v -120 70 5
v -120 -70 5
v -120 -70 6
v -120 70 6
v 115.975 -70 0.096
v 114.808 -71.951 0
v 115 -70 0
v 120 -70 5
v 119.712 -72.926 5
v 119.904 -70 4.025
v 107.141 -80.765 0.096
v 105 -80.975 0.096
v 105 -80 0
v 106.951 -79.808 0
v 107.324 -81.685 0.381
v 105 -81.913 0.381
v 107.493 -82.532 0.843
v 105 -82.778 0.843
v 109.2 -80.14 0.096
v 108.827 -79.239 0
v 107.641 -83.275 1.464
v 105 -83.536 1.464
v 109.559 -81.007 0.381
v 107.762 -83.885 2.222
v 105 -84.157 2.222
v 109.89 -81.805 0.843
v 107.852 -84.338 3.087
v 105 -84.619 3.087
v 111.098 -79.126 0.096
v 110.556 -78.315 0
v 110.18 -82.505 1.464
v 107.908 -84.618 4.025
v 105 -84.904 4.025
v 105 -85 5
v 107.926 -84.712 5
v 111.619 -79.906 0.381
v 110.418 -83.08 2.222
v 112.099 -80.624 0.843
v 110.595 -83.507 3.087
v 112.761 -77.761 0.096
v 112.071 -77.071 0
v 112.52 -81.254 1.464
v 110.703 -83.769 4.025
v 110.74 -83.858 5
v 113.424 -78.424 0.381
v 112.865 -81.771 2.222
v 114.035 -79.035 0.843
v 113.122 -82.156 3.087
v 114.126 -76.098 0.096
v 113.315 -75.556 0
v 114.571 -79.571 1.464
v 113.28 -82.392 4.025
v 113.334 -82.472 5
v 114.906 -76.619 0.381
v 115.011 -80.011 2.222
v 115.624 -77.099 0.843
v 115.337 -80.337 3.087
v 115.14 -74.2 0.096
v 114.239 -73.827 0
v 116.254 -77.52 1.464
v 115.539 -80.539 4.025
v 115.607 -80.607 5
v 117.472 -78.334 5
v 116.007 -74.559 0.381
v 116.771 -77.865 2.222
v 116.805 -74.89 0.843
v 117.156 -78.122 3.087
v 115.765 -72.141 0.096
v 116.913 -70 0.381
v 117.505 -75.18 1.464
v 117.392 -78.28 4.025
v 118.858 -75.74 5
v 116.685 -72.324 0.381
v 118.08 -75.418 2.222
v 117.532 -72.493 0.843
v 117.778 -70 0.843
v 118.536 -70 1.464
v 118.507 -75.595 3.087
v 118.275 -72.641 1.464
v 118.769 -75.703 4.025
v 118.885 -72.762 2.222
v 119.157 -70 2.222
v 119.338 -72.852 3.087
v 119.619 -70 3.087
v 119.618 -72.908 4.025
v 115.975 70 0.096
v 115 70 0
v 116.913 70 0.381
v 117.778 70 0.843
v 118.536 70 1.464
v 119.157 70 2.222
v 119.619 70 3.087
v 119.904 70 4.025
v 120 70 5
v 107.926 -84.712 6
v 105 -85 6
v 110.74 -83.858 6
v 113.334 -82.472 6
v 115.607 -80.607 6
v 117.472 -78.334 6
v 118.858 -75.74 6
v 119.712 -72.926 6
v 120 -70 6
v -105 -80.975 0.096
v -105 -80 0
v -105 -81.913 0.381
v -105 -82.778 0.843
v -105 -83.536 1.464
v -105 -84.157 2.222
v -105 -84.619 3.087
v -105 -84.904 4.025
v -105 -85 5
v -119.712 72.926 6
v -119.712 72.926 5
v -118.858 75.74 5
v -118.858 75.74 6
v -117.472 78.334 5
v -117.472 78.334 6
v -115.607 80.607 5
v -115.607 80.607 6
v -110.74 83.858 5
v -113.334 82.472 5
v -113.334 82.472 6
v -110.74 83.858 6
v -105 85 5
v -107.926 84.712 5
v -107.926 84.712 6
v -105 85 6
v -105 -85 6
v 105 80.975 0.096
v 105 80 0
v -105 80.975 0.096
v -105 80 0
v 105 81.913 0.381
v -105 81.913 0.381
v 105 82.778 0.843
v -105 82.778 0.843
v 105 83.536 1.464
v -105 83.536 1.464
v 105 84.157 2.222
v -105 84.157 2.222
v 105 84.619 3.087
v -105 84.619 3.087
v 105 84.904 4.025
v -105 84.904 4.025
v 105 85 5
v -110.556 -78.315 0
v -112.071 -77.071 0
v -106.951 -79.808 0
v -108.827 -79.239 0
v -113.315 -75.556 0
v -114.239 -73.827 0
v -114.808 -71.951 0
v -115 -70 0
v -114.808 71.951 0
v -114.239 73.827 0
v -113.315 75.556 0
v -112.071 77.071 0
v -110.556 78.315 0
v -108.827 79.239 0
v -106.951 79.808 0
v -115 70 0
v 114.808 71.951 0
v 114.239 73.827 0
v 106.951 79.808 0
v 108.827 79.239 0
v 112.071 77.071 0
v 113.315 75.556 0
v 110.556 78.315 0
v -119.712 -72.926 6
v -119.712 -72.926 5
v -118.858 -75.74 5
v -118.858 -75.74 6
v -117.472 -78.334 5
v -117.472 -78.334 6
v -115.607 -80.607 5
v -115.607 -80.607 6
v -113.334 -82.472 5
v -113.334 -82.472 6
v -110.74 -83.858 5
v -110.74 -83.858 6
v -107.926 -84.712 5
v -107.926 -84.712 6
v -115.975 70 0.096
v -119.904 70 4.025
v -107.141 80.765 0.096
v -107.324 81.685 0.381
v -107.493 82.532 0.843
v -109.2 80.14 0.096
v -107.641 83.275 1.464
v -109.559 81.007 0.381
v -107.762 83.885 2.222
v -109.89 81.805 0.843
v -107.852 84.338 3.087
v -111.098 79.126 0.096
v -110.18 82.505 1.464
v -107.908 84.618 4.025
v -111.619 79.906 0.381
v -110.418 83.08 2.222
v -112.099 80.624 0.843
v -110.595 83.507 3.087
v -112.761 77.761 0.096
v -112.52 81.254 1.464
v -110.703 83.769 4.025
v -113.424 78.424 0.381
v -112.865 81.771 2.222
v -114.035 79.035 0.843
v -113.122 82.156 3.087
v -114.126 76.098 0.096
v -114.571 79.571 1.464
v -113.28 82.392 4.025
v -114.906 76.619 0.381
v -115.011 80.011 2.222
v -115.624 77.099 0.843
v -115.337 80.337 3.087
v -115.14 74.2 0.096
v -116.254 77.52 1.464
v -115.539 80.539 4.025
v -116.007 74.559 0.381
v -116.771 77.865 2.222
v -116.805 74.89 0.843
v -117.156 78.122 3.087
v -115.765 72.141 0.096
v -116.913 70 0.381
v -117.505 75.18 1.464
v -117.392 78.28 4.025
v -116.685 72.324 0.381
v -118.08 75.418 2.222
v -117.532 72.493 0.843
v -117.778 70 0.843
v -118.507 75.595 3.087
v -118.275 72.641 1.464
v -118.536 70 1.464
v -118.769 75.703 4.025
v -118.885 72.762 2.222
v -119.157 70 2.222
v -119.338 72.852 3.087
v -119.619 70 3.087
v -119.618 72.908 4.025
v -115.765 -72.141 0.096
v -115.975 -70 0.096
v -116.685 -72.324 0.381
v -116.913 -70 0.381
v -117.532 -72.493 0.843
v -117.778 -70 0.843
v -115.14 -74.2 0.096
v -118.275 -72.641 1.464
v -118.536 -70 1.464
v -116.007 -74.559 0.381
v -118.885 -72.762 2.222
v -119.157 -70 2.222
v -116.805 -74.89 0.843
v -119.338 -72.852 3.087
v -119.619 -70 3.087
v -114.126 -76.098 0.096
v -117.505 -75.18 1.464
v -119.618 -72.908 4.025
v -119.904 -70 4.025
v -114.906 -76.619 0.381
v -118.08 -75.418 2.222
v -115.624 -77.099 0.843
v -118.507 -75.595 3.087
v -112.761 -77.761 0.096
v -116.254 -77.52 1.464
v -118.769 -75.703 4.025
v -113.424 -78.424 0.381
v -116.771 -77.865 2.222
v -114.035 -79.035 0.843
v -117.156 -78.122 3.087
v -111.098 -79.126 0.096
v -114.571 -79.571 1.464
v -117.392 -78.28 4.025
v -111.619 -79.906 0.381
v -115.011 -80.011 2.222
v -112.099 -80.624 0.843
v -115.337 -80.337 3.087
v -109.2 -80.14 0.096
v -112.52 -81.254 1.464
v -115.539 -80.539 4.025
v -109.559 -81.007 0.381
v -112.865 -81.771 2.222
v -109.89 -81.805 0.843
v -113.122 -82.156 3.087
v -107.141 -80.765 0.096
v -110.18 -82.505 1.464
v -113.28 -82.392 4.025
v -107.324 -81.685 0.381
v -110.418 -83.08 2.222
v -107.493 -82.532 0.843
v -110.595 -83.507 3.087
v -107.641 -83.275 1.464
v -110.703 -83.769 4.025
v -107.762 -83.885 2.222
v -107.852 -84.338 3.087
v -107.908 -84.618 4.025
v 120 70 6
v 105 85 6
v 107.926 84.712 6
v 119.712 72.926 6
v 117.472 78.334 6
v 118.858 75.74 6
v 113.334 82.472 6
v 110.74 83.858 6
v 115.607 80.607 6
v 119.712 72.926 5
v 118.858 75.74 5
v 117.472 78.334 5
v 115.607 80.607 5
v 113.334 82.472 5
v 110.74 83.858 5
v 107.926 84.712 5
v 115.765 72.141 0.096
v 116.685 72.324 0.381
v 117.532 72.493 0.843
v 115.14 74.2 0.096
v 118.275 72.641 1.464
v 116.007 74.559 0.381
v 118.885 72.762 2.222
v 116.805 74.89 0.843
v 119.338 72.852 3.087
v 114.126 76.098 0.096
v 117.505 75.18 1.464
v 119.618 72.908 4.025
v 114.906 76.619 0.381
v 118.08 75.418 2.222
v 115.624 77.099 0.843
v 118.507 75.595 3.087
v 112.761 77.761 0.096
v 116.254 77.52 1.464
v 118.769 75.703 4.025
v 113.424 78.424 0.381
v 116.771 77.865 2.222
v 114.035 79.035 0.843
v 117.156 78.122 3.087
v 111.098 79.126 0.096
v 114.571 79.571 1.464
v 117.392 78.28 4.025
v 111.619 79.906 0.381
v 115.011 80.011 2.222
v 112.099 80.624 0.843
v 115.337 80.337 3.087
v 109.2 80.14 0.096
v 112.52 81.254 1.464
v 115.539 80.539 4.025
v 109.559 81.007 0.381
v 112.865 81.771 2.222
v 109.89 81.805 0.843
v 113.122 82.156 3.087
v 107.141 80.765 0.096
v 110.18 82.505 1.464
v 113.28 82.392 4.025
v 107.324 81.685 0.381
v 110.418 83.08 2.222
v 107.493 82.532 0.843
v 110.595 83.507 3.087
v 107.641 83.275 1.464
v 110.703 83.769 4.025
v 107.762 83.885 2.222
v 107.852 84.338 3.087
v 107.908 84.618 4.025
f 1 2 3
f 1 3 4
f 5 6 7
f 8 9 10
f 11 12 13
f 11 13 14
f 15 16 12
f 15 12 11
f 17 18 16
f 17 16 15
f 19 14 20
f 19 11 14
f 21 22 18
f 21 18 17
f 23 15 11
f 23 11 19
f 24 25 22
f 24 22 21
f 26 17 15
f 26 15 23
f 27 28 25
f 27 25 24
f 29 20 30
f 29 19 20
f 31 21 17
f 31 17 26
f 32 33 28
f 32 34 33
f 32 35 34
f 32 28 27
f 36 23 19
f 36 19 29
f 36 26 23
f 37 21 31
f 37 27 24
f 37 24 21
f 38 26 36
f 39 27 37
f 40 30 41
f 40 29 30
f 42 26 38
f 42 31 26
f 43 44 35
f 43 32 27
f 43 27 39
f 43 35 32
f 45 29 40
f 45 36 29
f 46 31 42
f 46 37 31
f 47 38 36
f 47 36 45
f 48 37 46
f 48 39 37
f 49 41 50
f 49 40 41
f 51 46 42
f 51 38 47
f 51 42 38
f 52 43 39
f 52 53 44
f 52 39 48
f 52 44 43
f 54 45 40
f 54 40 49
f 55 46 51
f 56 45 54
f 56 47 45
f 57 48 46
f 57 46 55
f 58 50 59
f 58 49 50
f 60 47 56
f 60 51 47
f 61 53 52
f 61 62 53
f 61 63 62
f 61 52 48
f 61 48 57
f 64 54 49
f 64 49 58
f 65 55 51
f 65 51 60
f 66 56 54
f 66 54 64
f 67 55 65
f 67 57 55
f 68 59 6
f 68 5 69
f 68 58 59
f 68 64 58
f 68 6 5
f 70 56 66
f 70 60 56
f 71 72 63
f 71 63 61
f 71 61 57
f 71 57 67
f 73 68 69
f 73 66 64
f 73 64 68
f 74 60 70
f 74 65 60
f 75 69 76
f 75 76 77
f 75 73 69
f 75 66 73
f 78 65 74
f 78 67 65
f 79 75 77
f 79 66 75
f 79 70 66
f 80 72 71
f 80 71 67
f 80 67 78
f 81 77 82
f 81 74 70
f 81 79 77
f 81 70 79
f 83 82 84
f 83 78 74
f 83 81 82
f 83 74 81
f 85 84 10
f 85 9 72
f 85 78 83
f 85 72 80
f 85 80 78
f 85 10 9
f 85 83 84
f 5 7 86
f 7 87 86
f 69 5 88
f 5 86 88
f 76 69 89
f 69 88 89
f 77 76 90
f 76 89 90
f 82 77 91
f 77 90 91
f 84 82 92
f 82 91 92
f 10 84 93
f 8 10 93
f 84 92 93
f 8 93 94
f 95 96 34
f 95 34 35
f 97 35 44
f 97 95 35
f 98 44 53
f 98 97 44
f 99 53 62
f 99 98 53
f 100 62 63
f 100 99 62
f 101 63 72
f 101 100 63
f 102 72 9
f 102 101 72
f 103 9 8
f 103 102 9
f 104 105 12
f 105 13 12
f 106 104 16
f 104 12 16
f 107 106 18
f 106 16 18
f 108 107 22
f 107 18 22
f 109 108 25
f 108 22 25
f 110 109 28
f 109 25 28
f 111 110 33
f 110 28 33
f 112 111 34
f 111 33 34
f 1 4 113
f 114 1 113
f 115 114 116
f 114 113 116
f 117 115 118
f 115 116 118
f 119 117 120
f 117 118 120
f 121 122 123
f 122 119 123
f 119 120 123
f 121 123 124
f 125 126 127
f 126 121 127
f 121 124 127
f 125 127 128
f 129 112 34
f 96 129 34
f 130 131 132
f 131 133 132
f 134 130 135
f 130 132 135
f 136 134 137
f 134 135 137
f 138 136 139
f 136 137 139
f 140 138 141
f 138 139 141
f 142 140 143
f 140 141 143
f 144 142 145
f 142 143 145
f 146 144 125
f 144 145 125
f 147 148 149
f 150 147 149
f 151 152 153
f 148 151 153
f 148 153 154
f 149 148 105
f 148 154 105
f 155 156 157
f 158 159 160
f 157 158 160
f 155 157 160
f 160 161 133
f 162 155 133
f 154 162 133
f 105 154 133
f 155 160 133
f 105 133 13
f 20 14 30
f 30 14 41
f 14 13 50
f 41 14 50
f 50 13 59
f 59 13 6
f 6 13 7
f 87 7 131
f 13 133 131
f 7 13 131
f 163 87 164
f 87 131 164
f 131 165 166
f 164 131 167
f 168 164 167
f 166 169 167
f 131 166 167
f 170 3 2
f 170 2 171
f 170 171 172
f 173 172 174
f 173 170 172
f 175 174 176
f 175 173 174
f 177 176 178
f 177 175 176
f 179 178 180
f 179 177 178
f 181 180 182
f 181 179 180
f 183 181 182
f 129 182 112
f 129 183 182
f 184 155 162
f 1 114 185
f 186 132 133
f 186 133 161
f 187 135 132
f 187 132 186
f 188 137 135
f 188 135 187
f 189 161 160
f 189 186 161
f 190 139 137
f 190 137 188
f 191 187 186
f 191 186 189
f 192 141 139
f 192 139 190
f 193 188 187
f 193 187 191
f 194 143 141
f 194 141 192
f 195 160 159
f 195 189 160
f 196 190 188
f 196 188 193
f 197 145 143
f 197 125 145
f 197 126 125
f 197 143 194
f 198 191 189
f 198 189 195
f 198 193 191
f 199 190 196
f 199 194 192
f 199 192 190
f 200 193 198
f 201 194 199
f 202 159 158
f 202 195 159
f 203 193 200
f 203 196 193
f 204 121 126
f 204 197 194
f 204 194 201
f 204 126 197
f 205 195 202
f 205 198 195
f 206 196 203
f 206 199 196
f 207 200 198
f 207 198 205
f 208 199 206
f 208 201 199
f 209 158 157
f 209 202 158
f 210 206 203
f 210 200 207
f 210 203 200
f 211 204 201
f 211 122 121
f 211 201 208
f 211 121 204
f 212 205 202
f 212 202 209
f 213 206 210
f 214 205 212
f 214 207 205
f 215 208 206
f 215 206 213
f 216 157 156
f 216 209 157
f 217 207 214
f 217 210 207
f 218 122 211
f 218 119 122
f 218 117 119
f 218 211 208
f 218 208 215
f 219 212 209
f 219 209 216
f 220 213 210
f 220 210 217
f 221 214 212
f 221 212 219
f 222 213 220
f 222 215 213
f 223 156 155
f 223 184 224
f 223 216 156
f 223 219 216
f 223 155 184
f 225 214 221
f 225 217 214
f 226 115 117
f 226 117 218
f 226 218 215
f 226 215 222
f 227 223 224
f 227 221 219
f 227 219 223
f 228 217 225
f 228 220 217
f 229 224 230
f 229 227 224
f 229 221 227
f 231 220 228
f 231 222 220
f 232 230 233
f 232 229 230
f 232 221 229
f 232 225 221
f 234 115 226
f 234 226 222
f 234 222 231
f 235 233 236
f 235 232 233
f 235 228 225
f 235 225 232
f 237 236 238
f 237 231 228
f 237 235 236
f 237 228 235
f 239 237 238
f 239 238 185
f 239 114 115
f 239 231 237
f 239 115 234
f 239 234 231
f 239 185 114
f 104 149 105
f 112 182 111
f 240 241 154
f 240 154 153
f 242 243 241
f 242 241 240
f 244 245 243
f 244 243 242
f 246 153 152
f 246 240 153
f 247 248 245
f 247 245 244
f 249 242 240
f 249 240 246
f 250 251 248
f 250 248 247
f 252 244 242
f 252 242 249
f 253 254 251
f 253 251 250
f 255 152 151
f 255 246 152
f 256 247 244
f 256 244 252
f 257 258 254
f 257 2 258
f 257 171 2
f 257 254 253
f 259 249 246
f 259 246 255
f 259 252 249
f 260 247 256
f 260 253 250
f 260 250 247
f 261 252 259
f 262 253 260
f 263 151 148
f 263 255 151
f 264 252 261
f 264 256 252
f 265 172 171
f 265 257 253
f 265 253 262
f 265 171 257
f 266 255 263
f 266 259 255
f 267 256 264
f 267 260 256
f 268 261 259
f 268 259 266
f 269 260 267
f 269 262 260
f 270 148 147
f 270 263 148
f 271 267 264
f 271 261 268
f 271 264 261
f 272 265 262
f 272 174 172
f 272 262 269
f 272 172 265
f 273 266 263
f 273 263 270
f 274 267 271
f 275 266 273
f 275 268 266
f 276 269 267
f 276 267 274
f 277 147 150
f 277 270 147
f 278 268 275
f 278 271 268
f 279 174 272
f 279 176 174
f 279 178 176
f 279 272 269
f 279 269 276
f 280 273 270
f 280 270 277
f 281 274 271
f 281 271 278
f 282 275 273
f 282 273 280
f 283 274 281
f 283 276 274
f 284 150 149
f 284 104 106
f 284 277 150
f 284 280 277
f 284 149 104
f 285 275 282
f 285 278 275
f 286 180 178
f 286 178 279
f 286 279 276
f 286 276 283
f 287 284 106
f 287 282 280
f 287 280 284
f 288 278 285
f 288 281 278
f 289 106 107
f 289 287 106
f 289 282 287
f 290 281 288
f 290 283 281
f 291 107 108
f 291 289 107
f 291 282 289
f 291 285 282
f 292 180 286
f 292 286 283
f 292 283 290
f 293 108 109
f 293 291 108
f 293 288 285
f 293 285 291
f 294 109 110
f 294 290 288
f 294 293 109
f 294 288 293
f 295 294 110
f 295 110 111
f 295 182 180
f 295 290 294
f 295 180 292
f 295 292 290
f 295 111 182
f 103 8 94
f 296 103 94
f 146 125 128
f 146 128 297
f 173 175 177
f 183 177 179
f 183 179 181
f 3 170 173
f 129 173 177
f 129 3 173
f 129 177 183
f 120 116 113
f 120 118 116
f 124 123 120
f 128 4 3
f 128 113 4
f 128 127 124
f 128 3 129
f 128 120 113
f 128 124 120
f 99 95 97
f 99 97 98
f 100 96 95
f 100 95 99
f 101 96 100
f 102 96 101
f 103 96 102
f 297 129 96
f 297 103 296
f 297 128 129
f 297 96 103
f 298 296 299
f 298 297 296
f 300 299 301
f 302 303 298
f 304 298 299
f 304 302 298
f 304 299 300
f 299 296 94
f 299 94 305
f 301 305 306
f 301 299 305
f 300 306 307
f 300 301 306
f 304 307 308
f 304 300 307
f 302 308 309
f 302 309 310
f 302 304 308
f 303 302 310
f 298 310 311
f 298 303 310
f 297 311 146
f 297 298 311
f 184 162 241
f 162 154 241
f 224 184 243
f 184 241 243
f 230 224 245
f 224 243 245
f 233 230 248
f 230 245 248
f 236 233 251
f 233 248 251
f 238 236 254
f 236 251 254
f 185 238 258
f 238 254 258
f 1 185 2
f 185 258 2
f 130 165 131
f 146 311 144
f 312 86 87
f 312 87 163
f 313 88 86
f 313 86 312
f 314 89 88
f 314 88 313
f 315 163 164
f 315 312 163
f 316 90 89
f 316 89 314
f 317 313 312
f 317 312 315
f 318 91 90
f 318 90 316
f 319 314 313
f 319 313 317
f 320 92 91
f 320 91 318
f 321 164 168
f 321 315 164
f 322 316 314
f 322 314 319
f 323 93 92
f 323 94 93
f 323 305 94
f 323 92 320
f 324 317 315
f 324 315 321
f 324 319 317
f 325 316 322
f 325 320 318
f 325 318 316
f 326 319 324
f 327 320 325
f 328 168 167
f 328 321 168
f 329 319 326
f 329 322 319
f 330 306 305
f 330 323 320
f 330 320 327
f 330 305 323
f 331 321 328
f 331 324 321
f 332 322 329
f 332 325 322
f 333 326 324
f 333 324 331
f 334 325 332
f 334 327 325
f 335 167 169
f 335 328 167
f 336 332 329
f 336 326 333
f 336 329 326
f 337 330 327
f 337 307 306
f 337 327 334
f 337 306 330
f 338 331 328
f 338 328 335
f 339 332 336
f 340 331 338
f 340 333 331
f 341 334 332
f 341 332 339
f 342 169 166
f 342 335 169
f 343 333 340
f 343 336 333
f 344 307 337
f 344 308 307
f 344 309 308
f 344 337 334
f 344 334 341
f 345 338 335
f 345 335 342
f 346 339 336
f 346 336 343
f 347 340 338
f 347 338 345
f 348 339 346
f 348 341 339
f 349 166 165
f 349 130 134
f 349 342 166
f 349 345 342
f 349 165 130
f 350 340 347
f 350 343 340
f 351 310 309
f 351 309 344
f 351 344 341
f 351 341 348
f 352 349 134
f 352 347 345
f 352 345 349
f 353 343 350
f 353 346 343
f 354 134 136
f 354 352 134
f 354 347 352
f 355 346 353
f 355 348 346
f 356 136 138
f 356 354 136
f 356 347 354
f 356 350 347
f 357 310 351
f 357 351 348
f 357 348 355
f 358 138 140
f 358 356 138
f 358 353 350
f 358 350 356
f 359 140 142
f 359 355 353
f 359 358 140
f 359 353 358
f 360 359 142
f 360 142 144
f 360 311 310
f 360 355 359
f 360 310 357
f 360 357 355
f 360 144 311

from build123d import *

# Parameters (mm, degrees)
F0_W     = 240
F0_H     = 170
F1_DEPTH = 6
F2_R     = 15
F3_R     = 5


with BuildPart() as f1:
    # F0 (on Top) → F1 (new body)
    with BuildSketch(Plane.XY):
        Rectangle(F0_W, F0_H)
    extrude(amount=F1_DEPTH)

    # F2
    f2_edges = [f1.edges().sort_by_distance(p)[0] for p in [
        (-120, -85, 3),
        (-120, 85, 3),
        (120, 85, 3),
        (120, -85, 3),
    ]]
    fillet(f2_edges, radius=F2_R)

    # F3
    f3_edges = [f1.edges().sort_by_distance(p)[0] for p in [
        (120, 0, 0),
        (115.606602, -80.606602, 0),
        (115.606602, 80.606602, 0),
        (0, -85, 0),
        (0, 85, 0),
        (-115.606602, -80.606602, 0),
        (-115.606602, 80.606602, 0),
        (-120, 0, 0),
    ]]
    fillet(f3_edges, radius=F3_R)


solid = f1.part
